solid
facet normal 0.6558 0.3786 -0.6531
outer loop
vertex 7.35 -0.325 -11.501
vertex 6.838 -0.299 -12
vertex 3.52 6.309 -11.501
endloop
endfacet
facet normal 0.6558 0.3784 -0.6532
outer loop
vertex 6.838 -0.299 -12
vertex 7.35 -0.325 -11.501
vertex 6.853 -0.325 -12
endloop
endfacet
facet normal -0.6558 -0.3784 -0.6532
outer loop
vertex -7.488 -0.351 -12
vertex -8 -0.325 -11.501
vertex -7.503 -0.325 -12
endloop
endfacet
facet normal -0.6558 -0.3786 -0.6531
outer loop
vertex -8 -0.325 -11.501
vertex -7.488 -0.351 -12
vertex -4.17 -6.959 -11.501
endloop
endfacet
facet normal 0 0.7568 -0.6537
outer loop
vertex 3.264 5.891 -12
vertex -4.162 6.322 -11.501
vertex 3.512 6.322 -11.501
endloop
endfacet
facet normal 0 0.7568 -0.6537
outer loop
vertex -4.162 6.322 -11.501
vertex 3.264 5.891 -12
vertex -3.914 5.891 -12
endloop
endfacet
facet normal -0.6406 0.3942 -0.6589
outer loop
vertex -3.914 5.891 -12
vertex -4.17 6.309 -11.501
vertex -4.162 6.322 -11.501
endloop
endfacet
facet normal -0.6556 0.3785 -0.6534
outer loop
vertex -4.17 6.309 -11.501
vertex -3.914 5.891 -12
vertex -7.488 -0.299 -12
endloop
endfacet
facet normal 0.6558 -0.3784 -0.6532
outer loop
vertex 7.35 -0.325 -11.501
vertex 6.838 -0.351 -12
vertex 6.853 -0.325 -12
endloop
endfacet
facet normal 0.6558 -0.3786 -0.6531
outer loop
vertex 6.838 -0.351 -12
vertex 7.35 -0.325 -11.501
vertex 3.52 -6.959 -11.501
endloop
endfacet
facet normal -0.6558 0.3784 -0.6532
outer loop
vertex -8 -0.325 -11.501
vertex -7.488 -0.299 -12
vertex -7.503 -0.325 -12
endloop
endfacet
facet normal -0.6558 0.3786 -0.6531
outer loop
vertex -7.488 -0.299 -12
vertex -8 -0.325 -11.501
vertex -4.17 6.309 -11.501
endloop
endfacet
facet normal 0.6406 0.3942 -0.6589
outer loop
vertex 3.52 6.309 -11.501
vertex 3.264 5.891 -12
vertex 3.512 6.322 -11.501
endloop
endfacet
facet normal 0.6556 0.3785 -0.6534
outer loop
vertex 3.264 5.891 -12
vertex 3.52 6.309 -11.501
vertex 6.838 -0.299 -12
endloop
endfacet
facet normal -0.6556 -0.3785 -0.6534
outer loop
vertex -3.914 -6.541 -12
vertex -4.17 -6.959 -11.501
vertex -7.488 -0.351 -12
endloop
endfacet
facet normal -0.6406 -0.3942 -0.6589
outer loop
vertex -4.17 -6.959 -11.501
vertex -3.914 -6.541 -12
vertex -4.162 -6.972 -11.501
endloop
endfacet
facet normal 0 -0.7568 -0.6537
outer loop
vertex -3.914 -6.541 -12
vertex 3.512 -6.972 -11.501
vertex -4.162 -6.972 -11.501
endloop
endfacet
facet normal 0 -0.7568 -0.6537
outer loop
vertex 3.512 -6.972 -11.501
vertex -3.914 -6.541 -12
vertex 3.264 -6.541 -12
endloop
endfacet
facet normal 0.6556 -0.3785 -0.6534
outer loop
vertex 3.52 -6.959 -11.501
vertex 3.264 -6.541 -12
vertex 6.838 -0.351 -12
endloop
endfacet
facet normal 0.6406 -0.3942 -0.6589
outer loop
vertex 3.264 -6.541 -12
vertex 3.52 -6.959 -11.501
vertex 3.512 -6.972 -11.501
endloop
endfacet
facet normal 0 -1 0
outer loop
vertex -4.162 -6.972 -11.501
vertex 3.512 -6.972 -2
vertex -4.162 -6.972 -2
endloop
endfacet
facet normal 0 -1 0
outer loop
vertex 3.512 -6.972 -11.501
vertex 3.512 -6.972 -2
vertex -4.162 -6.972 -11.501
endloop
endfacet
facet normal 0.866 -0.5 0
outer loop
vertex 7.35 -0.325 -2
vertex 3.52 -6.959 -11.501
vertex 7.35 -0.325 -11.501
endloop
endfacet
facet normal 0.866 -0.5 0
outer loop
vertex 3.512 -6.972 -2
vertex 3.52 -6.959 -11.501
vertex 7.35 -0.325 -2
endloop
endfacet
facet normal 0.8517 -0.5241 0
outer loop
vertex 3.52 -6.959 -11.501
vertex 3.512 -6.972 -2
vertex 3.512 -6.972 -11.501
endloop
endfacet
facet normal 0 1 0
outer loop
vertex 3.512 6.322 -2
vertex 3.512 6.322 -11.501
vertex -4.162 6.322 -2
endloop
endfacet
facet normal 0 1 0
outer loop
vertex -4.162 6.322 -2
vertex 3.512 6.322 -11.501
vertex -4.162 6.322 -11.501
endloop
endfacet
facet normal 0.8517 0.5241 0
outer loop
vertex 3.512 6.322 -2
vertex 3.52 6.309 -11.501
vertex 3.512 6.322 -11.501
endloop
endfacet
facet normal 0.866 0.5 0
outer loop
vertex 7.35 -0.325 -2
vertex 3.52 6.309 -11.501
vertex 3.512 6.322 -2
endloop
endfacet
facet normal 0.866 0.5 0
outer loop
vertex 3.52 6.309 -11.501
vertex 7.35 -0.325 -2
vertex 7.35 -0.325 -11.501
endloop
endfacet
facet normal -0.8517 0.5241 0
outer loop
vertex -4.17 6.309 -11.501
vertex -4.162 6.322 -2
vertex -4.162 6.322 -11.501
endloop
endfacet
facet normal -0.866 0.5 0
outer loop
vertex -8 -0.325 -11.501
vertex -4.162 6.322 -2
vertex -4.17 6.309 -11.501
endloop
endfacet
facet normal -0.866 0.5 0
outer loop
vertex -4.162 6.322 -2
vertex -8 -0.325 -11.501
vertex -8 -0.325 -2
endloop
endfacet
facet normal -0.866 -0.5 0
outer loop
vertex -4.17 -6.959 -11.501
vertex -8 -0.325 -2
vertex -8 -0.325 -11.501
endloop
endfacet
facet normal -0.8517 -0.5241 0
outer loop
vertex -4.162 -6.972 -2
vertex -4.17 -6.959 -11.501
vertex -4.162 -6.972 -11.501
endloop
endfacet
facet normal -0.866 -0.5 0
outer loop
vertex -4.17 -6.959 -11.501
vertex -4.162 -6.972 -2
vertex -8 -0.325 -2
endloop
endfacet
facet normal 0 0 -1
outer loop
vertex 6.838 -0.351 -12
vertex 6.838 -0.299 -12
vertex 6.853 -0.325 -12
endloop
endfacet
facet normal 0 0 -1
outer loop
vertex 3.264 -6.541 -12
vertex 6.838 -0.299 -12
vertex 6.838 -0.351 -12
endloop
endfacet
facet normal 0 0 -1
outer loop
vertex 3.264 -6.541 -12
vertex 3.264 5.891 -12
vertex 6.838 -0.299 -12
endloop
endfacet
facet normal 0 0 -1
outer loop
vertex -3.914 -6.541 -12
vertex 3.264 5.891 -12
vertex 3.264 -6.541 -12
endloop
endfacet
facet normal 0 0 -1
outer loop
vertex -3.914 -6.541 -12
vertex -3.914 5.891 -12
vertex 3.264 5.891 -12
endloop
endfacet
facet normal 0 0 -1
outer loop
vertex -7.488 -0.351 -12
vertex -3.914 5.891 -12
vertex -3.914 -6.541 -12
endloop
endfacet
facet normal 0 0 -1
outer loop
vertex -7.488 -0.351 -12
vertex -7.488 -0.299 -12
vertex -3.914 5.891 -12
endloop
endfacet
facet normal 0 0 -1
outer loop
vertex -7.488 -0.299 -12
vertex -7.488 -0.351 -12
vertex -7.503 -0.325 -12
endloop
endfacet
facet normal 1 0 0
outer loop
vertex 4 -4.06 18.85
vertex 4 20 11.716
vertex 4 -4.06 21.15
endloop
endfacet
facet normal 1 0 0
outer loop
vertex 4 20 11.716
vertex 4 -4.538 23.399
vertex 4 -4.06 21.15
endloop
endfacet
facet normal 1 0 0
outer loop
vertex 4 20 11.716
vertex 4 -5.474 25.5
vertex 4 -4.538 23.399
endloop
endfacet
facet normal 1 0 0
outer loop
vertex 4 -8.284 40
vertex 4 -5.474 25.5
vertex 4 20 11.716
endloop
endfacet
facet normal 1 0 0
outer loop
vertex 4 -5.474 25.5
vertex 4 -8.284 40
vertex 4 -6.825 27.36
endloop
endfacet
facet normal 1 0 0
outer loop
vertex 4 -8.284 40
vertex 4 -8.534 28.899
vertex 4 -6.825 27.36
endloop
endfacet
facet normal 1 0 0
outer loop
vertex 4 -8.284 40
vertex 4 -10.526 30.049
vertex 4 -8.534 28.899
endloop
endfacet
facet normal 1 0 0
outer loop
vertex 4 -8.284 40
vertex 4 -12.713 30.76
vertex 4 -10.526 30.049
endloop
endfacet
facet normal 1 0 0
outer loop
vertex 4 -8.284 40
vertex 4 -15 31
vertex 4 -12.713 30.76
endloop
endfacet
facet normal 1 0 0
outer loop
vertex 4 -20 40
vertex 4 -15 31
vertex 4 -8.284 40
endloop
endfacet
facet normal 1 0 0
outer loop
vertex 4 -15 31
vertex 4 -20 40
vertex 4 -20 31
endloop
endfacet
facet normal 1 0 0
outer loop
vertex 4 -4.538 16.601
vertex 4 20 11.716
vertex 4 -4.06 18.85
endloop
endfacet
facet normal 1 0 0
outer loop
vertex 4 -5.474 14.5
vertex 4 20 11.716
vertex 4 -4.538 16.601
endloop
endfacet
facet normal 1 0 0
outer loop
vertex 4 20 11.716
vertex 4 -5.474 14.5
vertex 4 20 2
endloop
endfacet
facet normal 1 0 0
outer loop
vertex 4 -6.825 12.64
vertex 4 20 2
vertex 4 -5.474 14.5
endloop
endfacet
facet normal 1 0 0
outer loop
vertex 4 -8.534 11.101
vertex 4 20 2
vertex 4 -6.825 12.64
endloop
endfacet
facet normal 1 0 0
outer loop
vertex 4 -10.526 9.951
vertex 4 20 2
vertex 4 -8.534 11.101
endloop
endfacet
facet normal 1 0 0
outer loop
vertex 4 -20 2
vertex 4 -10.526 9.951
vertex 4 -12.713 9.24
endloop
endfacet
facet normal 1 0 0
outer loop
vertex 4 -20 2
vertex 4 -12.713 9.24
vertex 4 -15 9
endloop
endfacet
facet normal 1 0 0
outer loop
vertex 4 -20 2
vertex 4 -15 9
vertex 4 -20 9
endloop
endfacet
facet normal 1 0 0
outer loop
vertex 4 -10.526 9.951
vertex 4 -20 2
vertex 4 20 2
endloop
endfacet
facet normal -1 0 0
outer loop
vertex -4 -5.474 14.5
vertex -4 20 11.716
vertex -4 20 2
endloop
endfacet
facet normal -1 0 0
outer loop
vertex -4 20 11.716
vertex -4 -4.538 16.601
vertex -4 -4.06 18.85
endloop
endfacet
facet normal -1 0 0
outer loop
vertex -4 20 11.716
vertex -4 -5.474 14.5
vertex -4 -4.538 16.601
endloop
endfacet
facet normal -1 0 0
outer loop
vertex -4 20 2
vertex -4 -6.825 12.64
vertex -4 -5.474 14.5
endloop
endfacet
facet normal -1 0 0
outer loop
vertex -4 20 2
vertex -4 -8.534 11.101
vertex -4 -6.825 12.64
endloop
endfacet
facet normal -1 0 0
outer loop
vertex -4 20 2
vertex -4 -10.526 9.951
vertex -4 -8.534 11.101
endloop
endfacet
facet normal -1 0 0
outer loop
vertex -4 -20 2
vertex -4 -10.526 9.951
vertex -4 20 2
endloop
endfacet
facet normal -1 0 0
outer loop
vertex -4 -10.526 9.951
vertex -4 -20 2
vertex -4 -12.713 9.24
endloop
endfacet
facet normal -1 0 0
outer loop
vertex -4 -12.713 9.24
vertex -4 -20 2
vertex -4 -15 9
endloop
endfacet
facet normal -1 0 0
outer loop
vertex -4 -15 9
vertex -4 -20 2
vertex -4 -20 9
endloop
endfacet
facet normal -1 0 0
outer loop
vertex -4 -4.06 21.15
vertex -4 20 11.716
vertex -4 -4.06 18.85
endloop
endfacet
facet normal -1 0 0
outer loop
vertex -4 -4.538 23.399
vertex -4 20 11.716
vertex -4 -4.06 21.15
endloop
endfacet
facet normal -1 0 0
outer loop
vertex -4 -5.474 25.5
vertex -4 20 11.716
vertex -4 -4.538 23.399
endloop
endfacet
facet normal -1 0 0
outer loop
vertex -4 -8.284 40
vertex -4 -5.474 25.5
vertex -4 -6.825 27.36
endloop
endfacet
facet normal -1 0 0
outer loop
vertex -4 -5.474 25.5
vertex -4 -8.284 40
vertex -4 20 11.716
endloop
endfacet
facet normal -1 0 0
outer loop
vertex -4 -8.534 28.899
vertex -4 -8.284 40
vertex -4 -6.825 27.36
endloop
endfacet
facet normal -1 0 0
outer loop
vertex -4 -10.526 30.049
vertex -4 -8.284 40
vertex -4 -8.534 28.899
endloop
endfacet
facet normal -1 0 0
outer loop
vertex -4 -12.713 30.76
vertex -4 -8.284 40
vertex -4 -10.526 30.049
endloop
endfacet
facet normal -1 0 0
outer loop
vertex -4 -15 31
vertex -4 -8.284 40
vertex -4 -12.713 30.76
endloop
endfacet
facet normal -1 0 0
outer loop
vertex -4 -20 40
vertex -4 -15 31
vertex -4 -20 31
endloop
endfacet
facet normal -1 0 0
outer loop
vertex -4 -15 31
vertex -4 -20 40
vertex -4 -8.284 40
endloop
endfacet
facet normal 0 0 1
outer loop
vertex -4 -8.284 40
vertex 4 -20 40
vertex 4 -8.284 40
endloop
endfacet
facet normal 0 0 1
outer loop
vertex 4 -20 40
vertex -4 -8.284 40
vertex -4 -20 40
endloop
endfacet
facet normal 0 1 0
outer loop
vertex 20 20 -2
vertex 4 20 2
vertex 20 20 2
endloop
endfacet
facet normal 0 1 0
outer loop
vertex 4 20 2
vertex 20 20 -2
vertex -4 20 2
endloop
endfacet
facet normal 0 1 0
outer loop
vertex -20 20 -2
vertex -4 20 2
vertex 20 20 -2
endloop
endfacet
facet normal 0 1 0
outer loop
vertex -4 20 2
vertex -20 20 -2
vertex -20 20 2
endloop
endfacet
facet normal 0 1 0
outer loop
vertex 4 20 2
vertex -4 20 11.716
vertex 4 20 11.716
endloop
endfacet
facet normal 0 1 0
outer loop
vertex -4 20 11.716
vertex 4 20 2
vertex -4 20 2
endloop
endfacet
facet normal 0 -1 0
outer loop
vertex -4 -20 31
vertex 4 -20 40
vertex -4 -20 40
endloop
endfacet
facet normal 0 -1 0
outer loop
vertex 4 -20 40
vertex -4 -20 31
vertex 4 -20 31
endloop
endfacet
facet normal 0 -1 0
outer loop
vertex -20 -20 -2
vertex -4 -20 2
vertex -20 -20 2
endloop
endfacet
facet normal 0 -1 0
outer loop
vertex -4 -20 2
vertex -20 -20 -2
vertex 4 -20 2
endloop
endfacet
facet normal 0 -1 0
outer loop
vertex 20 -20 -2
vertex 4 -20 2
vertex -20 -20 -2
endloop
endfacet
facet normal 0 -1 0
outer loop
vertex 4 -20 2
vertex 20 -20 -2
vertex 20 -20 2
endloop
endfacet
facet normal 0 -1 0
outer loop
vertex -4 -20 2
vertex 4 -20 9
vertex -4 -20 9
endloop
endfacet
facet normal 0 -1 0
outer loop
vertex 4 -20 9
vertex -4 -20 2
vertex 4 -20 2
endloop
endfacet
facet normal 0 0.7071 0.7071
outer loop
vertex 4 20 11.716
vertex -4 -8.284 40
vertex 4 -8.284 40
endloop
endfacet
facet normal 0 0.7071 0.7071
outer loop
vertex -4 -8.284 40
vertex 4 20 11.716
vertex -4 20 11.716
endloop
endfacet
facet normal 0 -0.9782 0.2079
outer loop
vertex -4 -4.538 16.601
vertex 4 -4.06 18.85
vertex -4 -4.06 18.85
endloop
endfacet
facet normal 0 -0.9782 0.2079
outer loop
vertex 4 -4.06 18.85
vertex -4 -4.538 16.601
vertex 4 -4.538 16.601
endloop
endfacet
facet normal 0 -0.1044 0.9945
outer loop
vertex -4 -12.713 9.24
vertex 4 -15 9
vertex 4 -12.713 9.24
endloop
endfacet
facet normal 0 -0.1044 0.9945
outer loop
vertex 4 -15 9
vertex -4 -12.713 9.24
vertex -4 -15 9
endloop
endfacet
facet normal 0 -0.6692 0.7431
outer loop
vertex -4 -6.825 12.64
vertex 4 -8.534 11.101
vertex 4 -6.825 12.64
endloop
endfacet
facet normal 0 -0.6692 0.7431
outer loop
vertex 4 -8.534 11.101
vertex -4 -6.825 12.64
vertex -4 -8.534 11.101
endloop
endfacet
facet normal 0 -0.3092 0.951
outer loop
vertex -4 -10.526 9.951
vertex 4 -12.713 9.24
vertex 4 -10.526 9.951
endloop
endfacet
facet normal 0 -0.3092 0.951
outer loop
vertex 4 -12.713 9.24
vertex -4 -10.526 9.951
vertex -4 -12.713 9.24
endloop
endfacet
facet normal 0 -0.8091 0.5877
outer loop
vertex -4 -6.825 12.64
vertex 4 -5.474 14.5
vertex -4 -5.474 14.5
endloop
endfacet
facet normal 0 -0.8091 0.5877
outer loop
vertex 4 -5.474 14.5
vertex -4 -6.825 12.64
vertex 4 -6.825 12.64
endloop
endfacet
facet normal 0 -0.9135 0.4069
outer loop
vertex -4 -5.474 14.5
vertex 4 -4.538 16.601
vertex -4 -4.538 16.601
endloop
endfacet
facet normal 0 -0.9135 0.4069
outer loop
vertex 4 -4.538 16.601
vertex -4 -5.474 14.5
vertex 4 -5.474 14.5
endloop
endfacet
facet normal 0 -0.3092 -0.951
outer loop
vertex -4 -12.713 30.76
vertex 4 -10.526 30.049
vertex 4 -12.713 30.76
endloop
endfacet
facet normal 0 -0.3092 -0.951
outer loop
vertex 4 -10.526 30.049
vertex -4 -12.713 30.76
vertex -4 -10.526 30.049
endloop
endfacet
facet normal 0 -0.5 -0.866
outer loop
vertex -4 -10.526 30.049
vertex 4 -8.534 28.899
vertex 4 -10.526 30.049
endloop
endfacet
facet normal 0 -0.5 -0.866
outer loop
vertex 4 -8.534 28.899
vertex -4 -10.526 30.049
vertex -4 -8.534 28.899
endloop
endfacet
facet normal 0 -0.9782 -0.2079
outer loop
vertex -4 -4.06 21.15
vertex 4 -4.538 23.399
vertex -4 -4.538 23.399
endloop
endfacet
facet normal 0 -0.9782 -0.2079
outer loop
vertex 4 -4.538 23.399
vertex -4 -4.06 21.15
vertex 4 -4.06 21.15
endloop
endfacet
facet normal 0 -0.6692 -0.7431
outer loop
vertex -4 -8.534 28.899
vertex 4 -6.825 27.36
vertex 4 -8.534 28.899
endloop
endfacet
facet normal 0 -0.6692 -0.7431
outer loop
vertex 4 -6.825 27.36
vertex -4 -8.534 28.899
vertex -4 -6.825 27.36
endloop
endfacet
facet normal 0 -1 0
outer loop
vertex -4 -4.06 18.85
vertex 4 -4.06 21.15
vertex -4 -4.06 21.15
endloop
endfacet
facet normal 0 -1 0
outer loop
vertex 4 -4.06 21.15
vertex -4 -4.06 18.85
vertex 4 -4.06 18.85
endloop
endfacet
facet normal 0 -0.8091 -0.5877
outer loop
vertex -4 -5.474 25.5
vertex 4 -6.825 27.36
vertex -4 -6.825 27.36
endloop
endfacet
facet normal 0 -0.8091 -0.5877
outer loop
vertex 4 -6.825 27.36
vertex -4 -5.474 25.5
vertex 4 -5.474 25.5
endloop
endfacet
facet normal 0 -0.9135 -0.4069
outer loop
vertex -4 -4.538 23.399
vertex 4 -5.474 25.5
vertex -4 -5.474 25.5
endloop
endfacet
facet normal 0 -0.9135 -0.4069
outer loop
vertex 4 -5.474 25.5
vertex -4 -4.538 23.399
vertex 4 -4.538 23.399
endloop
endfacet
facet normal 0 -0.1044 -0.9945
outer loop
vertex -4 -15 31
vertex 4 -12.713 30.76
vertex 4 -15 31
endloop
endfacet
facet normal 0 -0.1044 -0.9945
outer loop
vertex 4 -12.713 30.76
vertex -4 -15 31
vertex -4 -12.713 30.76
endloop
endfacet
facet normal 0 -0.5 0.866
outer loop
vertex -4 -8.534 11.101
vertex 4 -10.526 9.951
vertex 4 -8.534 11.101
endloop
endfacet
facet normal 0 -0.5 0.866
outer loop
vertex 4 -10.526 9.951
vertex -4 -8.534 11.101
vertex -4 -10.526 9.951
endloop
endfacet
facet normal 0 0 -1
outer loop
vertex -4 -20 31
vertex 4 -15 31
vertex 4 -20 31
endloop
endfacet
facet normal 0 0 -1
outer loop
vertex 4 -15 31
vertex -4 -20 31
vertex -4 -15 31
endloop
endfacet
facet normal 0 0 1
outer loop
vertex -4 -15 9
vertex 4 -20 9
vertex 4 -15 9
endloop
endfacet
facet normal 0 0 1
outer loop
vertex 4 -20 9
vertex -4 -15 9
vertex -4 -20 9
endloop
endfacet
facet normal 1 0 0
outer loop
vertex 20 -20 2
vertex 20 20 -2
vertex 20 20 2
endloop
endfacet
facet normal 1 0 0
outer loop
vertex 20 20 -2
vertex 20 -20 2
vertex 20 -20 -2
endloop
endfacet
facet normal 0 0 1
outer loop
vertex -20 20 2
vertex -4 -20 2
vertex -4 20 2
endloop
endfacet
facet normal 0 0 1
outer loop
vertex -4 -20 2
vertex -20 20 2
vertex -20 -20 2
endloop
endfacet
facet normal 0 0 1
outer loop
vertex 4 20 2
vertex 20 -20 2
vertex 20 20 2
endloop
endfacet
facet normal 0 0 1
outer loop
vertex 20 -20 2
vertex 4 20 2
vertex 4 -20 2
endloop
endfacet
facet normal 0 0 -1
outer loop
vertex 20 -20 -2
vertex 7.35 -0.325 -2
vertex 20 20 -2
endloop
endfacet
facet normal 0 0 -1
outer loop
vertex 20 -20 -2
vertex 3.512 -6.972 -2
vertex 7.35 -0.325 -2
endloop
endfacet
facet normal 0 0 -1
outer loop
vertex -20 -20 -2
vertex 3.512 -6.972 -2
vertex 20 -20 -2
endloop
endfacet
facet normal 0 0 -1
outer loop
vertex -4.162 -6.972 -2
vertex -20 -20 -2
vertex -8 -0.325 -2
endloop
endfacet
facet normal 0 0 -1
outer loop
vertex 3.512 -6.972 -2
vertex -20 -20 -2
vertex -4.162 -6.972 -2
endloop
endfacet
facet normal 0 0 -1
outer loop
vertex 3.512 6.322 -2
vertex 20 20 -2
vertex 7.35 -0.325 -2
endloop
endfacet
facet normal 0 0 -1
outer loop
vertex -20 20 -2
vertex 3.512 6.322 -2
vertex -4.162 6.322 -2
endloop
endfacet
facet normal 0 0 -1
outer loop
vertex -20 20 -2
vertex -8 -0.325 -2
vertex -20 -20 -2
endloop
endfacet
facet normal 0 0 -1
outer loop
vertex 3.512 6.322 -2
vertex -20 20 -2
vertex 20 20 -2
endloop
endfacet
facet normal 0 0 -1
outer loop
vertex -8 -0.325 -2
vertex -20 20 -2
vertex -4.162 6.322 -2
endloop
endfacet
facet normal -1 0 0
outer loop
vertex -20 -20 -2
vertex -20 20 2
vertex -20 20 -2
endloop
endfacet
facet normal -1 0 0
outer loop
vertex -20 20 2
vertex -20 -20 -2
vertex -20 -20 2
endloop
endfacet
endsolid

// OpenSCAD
hsw_insert_diameter = 15.35;
hsw_insert_depth = 10.5;
hsw_chamfer_h = 0.5;

e = 0.001;

module circ_chamfer(r, h) {
    r2 = r-h/tan(45);
    translate([0,0,-h/2+e]) difference() {
        cylinder(r=r+2*e, h=h, center=true);
        cylinder(r1=r, r2=r2, h=h+2*e, center=true);
    }
}

module pin() {
	translate([hsw_insert_diameter / 2, hsw_insert_diameter / 2, 0])
	difference() {
		cylinder(d=hsw_insert_diameter, h=hsw_insert_depth, $fn=6);

	    translate([0,0,hsw_insert_depth])
	    circ_chamfer(hsw_insert_diameter/2, hsw_chamfer_h, $fn=6);

	    mirror([0,0,1])
	    circ_chamfer(hsw_insert_diameter/2+e, hsw_chamfer_h, $fn=6);
	}
}

translate([-8, -8, -12])
pin();
//translate([100, 0, 0])
//pin();




cube([40,40,4], center = true);

translate([0, 0, 20]) {    
    difference() {
        rotate([0, 90, 0])
        cube([40, 40, 8], center = true);
        
        translate([0, 20, 20])
        rotate([45, 0, 0])
        cube([40,40,40], center = true);

        translate([0, -15, 0])
        rotate([0, 90, 0])
        cylinder(d = 22, h=10, center=true);
        translate([0, -25, 0])
        cube([20, 20, 22], center = true);
    }
}
